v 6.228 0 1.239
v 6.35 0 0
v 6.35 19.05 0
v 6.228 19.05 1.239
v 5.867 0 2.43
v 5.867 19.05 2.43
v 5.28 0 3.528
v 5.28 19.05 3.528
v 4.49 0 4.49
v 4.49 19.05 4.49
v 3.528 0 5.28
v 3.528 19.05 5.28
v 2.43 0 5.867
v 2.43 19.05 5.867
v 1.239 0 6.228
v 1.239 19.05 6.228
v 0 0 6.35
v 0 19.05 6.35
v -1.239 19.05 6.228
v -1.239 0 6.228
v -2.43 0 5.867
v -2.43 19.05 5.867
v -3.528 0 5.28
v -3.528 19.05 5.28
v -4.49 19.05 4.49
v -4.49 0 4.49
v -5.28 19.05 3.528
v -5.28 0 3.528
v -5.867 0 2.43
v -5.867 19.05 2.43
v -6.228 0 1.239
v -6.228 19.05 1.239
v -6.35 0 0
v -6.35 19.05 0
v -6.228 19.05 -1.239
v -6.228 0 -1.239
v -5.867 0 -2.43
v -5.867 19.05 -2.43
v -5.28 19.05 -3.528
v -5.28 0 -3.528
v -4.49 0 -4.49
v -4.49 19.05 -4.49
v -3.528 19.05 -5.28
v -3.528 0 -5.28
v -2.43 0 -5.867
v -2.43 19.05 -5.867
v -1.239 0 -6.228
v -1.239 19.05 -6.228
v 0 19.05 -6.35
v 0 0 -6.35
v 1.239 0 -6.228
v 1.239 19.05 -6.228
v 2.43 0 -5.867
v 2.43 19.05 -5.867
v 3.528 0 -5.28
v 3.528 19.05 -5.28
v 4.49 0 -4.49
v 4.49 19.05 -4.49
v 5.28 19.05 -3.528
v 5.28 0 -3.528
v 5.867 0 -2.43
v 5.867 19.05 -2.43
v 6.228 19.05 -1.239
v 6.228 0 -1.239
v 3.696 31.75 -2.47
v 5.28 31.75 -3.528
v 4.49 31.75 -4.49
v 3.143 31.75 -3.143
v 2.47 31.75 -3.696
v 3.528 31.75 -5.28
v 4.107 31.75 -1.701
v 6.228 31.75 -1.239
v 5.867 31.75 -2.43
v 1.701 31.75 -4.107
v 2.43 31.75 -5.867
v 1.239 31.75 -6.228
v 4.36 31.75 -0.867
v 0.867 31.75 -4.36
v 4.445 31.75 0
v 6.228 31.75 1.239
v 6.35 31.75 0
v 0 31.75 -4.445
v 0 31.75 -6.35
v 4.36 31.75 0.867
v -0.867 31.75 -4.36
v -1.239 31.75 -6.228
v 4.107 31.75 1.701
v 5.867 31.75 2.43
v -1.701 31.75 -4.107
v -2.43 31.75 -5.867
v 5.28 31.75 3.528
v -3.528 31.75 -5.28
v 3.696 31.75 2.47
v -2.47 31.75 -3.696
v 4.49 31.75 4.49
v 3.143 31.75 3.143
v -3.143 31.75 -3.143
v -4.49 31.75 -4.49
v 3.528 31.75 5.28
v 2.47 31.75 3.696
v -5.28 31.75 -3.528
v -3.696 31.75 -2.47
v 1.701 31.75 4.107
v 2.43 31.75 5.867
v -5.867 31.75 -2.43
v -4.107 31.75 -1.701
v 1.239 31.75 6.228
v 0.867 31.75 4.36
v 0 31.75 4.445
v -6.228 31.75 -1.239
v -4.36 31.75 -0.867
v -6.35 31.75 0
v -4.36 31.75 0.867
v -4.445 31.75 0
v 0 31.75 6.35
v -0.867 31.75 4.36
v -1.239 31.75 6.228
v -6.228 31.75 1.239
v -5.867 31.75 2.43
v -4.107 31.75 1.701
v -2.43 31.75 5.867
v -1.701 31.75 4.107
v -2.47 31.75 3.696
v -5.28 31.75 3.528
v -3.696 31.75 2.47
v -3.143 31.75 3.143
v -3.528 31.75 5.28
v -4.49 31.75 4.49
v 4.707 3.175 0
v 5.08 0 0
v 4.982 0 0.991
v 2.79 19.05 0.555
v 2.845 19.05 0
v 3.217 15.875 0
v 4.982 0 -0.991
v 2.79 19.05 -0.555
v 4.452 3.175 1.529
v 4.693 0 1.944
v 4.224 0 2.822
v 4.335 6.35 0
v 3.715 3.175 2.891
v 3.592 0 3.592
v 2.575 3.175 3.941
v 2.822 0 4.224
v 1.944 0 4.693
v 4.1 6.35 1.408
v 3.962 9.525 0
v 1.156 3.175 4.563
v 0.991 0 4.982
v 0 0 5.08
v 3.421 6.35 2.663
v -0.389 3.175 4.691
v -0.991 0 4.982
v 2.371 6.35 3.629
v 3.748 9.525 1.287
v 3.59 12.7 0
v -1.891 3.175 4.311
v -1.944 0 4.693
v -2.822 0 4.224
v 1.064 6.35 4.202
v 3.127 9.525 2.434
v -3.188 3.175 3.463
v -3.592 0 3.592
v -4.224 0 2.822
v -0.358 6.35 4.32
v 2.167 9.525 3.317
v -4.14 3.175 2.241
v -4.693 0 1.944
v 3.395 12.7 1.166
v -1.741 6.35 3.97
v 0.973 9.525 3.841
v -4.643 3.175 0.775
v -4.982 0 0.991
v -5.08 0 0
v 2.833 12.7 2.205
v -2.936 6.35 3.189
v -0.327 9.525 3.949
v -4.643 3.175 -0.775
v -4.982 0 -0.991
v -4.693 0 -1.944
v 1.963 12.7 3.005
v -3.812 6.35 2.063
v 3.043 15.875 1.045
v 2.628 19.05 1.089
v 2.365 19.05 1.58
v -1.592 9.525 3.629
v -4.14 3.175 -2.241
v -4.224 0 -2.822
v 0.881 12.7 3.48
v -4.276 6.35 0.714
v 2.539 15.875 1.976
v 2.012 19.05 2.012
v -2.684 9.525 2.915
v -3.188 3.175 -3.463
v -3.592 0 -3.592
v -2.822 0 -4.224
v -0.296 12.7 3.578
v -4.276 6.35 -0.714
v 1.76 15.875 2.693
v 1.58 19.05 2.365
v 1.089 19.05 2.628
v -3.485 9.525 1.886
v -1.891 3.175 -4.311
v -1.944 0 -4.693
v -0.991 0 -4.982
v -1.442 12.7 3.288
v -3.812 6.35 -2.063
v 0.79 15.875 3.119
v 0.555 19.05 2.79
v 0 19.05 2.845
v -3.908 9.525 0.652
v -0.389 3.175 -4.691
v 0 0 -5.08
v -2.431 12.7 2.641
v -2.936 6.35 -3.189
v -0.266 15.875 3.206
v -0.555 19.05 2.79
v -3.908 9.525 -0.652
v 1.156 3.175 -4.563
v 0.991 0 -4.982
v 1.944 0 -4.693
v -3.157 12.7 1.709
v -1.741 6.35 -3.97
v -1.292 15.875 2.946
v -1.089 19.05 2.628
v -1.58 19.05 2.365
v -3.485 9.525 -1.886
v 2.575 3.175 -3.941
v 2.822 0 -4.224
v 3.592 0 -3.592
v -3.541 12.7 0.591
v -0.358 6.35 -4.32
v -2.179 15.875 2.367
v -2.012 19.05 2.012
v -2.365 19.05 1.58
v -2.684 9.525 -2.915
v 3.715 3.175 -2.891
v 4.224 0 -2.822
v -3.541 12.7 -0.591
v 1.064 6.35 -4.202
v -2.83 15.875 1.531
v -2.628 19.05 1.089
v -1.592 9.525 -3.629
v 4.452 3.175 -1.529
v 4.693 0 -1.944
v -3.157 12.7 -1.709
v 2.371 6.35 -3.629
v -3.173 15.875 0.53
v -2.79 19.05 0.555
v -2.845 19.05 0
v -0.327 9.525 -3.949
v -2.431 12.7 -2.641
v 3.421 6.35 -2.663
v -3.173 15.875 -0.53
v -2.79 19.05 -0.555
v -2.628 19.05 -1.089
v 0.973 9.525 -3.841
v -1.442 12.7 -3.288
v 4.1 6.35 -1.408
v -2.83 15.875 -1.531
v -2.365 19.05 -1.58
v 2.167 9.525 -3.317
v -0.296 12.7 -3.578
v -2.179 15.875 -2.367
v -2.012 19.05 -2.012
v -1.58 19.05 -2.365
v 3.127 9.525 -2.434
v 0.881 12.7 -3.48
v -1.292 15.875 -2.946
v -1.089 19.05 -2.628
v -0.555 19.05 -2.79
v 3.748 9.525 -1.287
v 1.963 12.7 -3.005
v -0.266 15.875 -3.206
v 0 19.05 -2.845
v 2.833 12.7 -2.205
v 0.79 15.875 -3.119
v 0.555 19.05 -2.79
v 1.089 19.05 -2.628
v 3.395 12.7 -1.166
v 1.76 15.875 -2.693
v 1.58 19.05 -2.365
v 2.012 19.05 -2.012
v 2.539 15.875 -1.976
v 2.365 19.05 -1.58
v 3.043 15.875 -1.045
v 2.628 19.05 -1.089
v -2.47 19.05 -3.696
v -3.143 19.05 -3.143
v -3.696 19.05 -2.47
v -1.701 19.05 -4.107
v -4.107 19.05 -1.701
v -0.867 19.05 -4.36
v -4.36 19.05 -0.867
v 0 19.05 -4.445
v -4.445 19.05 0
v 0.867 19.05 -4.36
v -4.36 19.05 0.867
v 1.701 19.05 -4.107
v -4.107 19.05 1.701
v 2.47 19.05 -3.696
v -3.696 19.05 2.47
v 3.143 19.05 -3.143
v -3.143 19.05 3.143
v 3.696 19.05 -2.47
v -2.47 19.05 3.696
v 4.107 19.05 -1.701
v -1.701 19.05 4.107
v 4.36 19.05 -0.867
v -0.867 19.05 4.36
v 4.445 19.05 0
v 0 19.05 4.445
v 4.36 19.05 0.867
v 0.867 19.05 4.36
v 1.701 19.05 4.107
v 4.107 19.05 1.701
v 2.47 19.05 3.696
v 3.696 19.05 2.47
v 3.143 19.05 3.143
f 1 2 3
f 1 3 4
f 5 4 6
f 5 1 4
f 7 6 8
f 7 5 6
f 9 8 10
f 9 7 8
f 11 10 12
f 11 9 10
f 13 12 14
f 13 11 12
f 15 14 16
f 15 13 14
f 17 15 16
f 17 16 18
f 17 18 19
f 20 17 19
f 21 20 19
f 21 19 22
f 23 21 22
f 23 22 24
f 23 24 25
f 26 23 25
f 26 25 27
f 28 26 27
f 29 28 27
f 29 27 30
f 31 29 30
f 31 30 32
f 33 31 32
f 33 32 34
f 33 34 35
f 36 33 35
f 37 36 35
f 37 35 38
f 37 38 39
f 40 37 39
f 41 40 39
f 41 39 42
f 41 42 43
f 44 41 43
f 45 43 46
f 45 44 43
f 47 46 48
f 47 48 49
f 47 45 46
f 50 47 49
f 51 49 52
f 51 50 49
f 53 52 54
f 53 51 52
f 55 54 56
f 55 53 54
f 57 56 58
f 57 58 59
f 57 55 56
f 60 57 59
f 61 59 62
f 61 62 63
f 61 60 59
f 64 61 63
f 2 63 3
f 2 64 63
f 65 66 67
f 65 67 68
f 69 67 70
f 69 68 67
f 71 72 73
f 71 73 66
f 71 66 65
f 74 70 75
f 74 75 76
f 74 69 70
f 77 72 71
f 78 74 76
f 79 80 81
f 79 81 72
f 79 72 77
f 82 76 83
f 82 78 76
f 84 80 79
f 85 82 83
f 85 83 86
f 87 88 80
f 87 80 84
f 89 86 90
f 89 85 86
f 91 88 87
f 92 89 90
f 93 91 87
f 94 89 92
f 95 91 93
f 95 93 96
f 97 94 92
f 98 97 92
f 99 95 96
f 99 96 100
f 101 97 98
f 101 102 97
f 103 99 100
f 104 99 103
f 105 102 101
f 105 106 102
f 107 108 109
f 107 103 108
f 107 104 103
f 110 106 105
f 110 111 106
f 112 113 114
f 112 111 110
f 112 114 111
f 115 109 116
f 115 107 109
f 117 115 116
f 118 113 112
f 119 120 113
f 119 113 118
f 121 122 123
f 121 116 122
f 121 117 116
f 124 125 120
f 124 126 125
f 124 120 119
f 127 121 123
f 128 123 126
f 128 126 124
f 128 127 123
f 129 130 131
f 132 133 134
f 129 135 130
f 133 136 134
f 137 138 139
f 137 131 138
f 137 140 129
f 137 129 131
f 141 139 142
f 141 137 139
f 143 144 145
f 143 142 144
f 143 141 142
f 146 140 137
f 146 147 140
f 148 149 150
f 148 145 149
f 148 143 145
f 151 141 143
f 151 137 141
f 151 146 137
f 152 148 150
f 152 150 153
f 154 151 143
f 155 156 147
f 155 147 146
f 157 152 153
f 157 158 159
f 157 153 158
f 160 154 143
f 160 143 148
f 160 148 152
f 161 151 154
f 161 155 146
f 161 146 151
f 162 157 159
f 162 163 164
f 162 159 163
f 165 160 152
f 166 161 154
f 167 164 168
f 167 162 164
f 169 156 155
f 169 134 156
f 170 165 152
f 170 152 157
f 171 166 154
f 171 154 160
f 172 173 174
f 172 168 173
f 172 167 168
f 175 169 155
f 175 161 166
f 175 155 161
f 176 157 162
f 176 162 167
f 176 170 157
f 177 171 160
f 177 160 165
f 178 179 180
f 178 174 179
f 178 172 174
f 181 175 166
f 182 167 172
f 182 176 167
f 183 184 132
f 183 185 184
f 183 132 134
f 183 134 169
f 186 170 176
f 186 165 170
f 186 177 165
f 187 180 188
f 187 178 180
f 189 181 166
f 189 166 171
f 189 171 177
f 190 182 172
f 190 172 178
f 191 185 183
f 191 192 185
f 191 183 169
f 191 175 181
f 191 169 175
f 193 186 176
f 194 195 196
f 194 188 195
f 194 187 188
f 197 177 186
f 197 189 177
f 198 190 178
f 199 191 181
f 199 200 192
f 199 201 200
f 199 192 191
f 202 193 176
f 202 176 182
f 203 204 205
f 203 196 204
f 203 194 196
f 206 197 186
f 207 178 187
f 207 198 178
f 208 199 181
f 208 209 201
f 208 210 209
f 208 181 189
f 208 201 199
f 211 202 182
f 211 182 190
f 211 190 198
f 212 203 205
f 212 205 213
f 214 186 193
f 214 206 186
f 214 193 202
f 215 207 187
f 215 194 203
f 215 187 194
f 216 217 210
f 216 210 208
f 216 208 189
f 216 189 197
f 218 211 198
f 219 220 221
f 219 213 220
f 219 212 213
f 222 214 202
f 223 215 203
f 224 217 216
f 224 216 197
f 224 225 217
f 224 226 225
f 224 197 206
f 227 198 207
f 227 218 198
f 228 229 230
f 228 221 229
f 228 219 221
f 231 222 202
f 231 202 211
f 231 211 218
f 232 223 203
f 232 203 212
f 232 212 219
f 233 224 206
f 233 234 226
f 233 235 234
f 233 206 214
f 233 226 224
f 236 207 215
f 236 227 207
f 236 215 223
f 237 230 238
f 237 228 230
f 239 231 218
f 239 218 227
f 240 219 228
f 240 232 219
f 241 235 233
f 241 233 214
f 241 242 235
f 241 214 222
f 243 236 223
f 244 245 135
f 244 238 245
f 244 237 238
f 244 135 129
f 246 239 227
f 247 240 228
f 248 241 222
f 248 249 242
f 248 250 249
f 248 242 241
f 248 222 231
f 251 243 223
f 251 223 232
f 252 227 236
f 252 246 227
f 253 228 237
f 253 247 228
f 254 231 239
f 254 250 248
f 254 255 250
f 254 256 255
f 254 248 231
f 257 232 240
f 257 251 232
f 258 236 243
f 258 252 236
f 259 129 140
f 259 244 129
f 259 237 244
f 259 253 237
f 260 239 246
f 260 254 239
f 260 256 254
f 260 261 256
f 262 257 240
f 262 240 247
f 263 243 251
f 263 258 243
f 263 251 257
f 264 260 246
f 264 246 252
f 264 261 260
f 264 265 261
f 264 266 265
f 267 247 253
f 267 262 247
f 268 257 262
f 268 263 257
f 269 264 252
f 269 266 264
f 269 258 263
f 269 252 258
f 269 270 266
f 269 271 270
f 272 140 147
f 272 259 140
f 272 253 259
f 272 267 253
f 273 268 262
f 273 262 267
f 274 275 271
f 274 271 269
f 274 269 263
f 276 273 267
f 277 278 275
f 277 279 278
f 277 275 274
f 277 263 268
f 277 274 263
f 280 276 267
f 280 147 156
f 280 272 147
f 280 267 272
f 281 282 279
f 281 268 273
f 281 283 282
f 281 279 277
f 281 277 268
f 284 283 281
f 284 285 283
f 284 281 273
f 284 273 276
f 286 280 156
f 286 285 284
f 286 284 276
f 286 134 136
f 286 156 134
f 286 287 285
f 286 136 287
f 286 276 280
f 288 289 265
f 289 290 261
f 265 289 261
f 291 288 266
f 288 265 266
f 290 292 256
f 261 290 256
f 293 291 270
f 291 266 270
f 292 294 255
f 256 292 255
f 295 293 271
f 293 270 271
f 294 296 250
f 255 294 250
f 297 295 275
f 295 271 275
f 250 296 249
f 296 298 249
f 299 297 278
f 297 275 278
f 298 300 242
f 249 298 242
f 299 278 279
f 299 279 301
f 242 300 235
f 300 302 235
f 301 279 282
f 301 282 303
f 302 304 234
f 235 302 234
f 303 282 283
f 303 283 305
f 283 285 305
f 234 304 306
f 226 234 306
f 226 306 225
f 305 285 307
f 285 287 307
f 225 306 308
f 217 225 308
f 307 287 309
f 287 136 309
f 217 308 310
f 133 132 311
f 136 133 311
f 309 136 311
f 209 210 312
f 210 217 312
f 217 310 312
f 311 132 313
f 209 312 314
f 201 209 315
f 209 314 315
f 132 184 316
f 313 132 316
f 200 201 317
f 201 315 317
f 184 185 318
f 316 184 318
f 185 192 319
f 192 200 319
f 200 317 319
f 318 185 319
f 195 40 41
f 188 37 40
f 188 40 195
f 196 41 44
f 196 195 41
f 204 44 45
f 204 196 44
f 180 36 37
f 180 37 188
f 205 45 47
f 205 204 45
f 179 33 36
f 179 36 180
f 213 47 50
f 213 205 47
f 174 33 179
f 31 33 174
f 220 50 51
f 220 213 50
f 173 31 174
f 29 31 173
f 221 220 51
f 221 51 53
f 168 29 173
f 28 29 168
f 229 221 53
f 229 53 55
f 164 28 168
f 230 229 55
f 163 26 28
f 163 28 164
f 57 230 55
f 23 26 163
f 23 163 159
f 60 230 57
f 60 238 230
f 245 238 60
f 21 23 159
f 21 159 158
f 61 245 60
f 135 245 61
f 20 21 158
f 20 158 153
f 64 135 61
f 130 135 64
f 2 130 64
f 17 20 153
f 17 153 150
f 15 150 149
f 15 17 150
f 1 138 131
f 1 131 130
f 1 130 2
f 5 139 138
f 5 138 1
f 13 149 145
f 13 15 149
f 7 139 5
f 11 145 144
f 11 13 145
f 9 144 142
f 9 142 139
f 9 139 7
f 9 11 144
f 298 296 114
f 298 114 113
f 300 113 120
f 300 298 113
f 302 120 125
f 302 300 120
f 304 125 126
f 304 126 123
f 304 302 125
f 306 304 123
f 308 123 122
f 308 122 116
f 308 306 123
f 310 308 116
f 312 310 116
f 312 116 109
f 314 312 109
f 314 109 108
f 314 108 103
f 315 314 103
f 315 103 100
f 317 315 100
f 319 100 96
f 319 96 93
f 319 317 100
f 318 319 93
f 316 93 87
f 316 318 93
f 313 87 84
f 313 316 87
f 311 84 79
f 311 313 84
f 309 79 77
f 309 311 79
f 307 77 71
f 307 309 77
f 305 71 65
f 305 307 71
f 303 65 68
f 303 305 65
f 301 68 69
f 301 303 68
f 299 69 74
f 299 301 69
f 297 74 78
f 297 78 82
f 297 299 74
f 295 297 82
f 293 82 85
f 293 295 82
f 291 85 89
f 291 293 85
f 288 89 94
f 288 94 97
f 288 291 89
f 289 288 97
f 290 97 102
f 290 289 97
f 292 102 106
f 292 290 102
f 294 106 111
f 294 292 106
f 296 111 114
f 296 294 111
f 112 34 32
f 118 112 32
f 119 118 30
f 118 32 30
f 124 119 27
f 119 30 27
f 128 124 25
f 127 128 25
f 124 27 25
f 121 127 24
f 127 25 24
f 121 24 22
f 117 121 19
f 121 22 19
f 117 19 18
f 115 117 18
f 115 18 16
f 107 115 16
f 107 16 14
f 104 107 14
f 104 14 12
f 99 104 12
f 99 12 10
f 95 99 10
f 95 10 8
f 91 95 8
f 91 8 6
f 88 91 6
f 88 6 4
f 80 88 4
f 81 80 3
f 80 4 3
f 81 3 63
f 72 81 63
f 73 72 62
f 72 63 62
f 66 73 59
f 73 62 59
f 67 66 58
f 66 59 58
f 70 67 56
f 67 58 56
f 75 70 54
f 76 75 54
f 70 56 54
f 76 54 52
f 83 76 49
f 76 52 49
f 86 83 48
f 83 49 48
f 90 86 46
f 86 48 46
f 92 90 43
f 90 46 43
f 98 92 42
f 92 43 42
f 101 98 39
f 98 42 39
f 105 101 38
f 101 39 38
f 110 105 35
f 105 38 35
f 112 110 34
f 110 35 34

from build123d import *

# Parameters (mm, degrees)
F0_R     = 6.35
F5_DEPTH = 19.05
F1_R     = 5.08
F4_R     = 2.8448
F7_R     = 6.35
F7_R_2   = 4.445
F8_DEPTH = 12.7


with BuildPart() as f5:
    # F0 (on Front) → F5 (new body)
    with BuildSketch(Plane.XZ):
        Circle(F0_R)
    extrude(amount=-F5_DEPTH)

    # F1 (on face) → F6 section 0
    with BuildSketch(Plane.XZ):
        Circle(F1_R)
    # F4 (on line) → F6 section 1
    with BuildSketch(Plane(origin=(0, 19.05, 0), x_dir=(-1, 0, 0), z_dir=(0, 1, 0))):
        Circle(F4_R)
    loft(mode=Mode.SUBTRACT)

    # F7 (on face) → F8 (join)
    with BuildSketch(Plane(origin=(0, 19.05, 0), x_dir=(-1, 0, 0), z_dir=(0, 1, 0))):
        Circle(F7_R)
        Circle(F7_R_2, mode=Mode.SUBTRACT)
    extrude(amount=F8_DEPTH)


solid = f5.part
